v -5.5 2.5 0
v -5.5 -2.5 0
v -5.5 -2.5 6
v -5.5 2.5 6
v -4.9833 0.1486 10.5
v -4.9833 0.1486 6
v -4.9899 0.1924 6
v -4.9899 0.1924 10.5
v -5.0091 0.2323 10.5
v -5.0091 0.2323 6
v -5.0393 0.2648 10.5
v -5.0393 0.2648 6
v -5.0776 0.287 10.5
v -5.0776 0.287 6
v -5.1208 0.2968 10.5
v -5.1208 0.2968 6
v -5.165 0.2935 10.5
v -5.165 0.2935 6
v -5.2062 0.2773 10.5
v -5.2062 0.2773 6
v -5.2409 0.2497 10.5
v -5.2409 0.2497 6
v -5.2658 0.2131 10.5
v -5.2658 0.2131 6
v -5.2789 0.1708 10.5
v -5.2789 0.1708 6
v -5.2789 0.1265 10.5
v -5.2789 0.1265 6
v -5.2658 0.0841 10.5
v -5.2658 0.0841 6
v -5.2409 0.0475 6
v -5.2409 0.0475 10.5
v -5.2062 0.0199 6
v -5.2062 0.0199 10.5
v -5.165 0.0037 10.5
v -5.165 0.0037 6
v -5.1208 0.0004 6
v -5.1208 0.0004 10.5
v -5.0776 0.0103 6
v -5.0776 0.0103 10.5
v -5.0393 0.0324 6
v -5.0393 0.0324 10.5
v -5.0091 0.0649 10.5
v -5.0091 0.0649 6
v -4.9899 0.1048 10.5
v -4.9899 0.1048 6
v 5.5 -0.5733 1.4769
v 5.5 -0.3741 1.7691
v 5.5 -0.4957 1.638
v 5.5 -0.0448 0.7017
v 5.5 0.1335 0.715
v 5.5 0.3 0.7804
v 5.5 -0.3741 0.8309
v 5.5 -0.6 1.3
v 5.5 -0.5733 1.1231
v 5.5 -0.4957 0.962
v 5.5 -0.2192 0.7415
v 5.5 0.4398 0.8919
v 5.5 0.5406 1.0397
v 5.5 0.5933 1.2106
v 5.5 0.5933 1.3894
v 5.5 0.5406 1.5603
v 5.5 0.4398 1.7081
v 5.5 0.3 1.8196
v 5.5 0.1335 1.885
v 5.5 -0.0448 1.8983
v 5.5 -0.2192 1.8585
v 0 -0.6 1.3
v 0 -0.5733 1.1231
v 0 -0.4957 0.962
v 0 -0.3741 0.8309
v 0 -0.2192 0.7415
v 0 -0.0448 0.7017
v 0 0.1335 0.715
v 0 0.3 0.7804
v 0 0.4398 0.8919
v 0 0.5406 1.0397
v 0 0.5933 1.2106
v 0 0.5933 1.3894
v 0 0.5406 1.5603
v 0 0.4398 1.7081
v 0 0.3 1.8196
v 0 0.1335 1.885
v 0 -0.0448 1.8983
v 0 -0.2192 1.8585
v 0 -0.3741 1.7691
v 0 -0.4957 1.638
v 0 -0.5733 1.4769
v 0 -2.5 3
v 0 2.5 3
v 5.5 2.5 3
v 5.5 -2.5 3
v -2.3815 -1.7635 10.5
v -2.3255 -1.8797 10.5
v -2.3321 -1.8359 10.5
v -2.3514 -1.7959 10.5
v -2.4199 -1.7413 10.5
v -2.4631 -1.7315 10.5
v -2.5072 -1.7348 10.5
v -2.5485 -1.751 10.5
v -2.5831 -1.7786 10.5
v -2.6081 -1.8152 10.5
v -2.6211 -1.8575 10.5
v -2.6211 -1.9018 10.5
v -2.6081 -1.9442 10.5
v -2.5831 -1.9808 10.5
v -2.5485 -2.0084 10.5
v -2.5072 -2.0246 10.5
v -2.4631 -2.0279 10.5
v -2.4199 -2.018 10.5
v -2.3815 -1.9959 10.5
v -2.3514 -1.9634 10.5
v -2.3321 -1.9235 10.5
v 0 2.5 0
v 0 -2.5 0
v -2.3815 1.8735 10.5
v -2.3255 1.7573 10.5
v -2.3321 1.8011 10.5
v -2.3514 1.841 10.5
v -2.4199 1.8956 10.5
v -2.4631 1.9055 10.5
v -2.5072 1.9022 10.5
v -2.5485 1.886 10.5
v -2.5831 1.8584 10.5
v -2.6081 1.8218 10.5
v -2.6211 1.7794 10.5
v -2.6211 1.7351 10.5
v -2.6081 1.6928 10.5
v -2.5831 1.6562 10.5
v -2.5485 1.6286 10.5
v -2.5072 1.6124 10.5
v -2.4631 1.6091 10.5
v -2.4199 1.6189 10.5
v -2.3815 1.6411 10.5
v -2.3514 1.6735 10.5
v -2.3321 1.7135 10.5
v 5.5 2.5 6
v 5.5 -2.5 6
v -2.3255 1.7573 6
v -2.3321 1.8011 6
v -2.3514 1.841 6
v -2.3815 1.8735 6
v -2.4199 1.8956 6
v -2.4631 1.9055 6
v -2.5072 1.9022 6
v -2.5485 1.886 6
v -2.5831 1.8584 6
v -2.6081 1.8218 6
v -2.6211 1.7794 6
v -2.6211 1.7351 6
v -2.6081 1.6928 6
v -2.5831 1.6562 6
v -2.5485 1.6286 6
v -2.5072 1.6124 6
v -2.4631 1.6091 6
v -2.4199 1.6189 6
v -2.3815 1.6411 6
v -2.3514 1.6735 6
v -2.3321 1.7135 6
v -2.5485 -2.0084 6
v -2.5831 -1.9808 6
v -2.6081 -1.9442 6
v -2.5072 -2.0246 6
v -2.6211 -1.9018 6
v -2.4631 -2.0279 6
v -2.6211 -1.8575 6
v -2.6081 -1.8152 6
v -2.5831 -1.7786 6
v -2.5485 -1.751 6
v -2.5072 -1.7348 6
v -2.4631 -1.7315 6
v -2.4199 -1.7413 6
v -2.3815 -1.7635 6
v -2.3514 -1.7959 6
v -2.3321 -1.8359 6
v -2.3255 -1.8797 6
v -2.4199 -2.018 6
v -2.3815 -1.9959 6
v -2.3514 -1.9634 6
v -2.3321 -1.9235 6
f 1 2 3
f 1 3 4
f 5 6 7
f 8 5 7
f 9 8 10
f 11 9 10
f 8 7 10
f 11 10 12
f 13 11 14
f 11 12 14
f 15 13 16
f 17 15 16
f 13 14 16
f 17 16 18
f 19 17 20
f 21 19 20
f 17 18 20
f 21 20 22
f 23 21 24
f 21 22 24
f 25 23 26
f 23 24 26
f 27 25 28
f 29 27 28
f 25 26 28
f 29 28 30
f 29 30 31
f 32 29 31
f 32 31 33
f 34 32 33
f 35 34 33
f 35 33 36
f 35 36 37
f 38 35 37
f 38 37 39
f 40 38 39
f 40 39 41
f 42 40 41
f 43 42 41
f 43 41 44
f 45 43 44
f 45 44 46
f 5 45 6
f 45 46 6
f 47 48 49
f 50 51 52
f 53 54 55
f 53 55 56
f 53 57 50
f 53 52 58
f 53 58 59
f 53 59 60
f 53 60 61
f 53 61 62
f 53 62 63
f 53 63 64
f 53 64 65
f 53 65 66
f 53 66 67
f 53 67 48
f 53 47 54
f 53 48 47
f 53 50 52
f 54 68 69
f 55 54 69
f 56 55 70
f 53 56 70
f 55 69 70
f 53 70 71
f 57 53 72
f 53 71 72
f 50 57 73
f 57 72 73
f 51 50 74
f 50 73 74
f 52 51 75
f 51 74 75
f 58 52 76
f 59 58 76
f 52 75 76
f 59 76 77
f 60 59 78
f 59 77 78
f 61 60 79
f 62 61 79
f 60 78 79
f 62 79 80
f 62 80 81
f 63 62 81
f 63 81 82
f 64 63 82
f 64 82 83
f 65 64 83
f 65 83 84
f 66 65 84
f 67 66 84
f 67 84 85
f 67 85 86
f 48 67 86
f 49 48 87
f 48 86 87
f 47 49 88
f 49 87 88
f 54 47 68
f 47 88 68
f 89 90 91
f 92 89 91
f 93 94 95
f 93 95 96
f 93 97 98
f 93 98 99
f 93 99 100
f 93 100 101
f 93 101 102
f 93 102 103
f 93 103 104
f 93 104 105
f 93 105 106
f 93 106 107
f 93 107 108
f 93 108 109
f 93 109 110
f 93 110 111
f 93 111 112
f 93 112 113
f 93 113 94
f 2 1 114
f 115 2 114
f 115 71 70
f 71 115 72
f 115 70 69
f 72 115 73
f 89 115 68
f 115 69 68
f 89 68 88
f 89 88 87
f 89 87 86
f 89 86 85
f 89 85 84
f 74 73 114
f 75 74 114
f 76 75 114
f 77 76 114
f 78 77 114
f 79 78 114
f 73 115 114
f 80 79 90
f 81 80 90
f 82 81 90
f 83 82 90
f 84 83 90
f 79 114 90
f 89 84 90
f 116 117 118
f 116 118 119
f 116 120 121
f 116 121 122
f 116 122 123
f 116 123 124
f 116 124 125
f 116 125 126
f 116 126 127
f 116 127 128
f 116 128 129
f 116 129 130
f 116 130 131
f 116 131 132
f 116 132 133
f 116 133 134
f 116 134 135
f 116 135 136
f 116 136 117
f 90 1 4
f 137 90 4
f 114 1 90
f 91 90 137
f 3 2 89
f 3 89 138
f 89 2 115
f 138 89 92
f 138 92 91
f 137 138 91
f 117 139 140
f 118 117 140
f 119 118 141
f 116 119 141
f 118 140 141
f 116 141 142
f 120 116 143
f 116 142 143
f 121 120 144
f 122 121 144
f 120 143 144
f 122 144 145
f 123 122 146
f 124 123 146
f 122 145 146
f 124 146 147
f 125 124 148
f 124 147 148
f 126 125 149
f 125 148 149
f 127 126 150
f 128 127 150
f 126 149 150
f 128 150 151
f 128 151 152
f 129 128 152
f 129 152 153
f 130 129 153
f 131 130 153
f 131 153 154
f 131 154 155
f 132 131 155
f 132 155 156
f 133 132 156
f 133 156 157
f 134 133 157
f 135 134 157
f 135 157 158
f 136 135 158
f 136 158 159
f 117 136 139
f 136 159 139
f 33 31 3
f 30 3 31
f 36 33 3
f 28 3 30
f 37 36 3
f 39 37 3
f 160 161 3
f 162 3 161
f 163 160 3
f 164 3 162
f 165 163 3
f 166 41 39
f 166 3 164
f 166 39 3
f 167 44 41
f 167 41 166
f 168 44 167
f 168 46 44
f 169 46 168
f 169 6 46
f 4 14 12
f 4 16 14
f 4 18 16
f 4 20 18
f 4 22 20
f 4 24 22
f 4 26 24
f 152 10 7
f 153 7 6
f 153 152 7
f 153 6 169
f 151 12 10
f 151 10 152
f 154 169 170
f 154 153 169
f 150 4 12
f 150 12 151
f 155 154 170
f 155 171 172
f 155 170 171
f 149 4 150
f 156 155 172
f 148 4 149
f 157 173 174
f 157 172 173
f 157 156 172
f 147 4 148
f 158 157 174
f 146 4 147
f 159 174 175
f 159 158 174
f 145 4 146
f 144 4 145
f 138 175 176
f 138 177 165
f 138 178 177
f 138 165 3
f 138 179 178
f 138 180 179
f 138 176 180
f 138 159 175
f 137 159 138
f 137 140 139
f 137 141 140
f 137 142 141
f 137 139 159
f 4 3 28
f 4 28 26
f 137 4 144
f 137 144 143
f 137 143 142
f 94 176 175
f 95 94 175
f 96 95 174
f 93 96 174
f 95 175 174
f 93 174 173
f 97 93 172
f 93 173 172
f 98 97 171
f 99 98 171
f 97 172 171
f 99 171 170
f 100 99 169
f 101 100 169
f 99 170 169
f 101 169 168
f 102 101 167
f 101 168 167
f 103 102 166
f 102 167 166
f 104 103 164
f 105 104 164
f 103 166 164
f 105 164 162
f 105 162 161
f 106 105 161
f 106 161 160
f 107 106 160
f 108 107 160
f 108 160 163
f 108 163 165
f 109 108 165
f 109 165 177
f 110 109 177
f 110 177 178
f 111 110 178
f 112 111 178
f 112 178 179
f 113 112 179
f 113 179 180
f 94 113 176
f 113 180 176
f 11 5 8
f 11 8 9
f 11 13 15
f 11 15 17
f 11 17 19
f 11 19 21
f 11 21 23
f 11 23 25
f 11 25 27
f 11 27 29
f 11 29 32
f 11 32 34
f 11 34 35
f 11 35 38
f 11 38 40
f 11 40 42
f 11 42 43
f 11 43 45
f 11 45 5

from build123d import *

# Parameters (mm, degrees)
SKETCH_1_W          = 11
SKETCH_1_H          = 5
EXTRUDE_2_DEPTH     = 6
CUT_EXTRUDE_2_DEPTH = 10.552486587
SKETCH_3_R          = 0.6
EXTRUDE_3_DEPTH     = 5.5
SKETCH_4_R          = 0.14862502
EXTRUDE_4_DEPTH     = 4.5


with BuildPart() as part:
    # 草图1 → 拉伸2 (new body)
    with BuildSketch(Plane.XY):
        Rectangle(SKETCH_1_W, SKETCH_1_H)
    extrude(amount=EXTRUDE_2_DEPTH)

    # 草图2 → 切除-拉伸2 (cut, through all)
    with BuildSketch(Plane(origin=(0, 2.5, 0), x_dir=(-1, 0, 0), z_dir=(0, 1, 0))):
        Polygon((-44.7283548, 3), (-7.684787792, 3), (0, 3), (0, -1.817199173), (0, -38.860766181), (-50.624833681, -92.953553513), (-95.353188481, -51.092787332), align=None)
    extrude(amount=-CUT_EXTRUDE_2_DEPTH, mode=Mode.SUBTRACT)

    # 草图3 → 拉伸3 (add)
    with BuildSketch(Plane(origin=(0, 0, 0), x_dir=(0, 0, -1), z_dir=(1, 0, 0))):
        with Locations(Location((-1.3, 0, 0), (0, 0, 270))):
            Circle(SKETCH_3_R)
    extrude(amount=EXTRUDE_3_DEPTH)

    # 草图4 → 拉伸4 (add)
    with BuildSketch(Plane.XY.offset(6)):
        with Locations((-5.13193451, 0.14862502)):
            Circle(SKETCH_4_R)
        with Locations((-2.474169448, 1.757272294)):
            Circle(SKETCH_4_R)
        with Locations((-2.474169448, -1.879669369)):
            Circle(SKETCH_4_R)
    extrude(amount=EXTRUDE_4_DEPTH)


solid = part.part
